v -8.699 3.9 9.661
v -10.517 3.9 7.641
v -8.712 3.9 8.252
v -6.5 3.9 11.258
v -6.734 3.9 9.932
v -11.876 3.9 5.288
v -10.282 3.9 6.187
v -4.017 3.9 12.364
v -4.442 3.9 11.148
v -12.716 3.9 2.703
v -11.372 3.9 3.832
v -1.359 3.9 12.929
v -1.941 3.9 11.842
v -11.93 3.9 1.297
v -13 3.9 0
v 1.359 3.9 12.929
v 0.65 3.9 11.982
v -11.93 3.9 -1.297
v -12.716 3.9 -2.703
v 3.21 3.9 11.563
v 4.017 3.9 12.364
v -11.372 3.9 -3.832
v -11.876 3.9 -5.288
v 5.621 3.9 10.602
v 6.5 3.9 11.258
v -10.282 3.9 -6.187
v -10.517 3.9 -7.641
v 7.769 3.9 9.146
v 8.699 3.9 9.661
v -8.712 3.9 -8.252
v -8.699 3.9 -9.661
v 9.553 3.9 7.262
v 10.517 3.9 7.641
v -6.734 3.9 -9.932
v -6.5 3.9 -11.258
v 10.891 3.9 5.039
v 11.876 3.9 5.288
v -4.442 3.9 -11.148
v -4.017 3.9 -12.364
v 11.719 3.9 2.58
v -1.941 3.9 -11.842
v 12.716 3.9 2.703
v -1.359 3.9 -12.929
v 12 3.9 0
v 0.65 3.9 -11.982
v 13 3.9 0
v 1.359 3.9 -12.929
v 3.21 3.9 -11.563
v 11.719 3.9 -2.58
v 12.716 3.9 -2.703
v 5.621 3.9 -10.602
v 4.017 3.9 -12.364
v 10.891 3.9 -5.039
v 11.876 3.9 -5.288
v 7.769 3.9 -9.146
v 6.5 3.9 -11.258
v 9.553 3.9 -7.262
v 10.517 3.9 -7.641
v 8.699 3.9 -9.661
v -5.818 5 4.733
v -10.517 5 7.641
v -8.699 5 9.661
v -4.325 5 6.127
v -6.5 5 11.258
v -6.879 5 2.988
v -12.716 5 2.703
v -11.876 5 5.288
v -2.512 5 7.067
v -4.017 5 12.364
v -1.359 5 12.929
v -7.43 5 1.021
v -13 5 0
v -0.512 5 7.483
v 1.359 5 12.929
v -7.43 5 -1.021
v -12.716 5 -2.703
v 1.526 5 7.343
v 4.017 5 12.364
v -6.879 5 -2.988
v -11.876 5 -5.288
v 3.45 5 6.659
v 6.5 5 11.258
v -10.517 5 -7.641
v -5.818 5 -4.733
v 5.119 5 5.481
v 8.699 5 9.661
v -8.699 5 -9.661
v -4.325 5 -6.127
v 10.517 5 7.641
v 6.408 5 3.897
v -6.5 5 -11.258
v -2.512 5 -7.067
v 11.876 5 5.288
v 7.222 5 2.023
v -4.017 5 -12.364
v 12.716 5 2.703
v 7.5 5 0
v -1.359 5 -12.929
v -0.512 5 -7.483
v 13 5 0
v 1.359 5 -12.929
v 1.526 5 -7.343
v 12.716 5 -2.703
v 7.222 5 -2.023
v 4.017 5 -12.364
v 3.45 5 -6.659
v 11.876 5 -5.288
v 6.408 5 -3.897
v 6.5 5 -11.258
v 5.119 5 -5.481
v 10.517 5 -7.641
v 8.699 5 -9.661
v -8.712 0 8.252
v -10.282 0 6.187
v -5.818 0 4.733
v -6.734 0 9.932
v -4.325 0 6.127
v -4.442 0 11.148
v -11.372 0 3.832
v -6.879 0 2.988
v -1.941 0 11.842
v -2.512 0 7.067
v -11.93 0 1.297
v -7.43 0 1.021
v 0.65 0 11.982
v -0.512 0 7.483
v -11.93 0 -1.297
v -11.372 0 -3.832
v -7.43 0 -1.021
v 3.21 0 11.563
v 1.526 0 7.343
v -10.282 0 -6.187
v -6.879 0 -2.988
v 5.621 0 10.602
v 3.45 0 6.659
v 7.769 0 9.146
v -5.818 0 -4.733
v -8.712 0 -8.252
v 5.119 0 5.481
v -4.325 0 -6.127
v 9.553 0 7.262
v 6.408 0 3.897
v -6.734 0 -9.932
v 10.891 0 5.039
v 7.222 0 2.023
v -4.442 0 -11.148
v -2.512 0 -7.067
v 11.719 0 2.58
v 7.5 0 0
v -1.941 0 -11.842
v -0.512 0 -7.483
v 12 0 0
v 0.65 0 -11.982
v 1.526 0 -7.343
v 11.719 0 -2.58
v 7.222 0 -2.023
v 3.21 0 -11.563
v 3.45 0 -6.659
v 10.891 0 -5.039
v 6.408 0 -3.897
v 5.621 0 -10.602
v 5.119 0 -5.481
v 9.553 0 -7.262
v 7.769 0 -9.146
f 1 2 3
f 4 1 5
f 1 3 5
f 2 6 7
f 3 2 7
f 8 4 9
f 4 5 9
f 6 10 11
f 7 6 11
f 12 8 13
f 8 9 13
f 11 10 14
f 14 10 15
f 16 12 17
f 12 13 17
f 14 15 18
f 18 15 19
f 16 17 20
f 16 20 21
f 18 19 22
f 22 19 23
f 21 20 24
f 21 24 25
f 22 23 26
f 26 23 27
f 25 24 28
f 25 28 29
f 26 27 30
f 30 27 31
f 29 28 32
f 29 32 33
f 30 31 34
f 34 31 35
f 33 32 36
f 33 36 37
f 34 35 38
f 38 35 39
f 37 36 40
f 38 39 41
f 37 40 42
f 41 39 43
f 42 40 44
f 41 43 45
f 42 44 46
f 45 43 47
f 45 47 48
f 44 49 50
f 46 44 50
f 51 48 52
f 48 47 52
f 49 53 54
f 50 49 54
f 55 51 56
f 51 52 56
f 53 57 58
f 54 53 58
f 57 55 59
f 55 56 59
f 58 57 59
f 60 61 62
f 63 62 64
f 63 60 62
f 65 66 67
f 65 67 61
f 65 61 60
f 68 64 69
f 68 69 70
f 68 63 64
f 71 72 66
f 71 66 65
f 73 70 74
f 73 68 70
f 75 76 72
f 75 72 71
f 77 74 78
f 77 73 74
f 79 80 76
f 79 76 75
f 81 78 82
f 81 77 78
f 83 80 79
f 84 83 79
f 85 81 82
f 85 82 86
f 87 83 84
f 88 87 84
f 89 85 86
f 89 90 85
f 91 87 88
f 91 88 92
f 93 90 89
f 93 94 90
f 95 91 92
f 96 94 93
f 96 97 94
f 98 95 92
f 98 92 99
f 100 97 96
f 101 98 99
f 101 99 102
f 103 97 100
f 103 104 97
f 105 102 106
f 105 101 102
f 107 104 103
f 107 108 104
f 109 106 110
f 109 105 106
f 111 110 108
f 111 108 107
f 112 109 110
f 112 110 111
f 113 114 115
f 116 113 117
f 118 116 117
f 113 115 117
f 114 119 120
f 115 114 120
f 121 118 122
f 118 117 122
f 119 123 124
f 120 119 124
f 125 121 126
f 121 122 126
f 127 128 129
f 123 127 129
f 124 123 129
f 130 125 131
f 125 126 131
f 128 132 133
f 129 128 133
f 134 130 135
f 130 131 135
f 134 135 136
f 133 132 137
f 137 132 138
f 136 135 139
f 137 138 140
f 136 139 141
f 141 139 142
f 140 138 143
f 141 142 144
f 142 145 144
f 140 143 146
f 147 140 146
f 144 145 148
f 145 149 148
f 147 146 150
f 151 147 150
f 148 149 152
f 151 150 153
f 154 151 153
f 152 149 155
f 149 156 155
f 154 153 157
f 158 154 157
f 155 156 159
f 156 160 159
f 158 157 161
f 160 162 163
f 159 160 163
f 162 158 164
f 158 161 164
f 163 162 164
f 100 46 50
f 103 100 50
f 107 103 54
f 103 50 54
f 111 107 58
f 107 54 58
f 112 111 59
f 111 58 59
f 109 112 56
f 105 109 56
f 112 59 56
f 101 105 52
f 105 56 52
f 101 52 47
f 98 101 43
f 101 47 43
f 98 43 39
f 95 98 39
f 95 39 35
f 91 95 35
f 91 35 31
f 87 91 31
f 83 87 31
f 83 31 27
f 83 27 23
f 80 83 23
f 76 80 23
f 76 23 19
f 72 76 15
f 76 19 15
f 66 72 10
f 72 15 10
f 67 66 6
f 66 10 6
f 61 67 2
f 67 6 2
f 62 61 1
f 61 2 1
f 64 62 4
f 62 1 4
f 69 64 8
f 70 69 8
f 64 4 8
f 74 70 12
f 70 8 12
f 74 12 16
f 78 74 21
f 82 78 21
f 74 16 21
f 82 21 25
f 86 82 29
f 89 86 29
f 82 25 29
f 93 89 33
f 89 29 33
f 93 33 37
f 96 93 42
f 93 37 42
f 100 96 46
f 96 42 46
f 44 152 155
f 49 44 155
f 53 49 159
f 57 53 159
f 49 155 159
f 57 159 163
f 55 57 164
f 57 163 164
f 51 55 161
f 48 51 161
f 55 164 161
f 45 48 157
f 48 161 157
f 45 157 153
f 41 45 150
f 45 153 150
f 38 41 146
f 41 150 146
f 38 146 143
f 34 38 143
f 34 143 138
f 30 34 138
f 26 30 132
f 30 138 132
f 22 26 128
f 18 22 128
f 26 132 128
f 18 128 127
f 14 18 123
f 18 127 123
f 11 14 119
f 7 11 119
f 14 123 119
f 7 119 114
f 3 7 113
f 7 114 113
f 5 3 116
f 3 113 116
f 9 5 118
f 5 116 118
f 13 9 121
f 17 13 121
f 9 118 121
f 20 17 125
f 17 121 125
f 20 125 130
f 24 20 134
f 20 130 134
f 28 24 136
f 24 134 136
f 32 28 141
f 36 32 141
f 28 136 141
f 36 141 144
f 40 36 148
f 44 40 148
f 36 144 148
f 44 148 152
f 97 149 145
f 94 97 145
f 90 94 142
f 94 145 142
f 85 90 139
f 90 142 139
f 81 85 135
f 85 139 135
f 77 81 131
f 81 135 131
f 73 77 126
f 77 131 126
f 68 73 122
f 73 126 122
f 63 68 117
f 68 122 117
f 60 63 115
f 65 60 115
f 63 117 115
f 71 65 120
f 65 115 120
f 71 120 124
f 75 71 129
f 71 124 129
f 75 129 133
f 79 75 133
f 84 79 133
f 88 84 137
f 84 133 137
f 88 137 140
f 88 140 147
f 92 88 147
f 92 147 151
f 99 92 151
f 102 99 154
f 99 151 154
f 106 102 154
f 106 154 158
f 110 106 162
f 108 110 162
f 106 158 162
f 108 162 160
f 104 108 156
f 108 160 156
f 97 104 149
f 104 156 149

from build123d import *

# Parameters (mm, degrees)
SKETCH_1_R          = 12
EXTRUDE_1_DEPTH     = 3.9
SKETCH_2_R          = 13
EXTRUDE_2_DEPTH     = 1.1
SKETCH_3_R          = 7.5
CUT_EXTRUDE_1_DEPTH = 5


with BuildPart() as part:
    # 草图1 → 凸台-拉伸1 (new body)
    with BuildSketch(Plane(origin=(0, 0, 0), x_dir=(1, 0, 0), z_dir=(0, 1, 0))):
        Circle(SKETCH_1_R)
    extrude(amount=EXTRUDE_1_DEPTH)

    # 草图2 → 凸台-拉伸2 (add)
    with BuildSketch(Plane(origin=(0, 3.9, 0), x_dir=(1, 0, 0), z_dir=(0, 1, 0))):
        Circle(SKETCH_2_R)
    extrude(amount=EXTRUDE_2_DEPTH)

    # 草图3 → 切除-拉伸1 (cut)
    with BuildSketch(Plane.XZ):
        Circle(SKETCH_3_R)
    extrude(amount=-CUT_EXTRUDE_1_DEPTH, mode=Mode.SUBTRACT)


solid = part.part
